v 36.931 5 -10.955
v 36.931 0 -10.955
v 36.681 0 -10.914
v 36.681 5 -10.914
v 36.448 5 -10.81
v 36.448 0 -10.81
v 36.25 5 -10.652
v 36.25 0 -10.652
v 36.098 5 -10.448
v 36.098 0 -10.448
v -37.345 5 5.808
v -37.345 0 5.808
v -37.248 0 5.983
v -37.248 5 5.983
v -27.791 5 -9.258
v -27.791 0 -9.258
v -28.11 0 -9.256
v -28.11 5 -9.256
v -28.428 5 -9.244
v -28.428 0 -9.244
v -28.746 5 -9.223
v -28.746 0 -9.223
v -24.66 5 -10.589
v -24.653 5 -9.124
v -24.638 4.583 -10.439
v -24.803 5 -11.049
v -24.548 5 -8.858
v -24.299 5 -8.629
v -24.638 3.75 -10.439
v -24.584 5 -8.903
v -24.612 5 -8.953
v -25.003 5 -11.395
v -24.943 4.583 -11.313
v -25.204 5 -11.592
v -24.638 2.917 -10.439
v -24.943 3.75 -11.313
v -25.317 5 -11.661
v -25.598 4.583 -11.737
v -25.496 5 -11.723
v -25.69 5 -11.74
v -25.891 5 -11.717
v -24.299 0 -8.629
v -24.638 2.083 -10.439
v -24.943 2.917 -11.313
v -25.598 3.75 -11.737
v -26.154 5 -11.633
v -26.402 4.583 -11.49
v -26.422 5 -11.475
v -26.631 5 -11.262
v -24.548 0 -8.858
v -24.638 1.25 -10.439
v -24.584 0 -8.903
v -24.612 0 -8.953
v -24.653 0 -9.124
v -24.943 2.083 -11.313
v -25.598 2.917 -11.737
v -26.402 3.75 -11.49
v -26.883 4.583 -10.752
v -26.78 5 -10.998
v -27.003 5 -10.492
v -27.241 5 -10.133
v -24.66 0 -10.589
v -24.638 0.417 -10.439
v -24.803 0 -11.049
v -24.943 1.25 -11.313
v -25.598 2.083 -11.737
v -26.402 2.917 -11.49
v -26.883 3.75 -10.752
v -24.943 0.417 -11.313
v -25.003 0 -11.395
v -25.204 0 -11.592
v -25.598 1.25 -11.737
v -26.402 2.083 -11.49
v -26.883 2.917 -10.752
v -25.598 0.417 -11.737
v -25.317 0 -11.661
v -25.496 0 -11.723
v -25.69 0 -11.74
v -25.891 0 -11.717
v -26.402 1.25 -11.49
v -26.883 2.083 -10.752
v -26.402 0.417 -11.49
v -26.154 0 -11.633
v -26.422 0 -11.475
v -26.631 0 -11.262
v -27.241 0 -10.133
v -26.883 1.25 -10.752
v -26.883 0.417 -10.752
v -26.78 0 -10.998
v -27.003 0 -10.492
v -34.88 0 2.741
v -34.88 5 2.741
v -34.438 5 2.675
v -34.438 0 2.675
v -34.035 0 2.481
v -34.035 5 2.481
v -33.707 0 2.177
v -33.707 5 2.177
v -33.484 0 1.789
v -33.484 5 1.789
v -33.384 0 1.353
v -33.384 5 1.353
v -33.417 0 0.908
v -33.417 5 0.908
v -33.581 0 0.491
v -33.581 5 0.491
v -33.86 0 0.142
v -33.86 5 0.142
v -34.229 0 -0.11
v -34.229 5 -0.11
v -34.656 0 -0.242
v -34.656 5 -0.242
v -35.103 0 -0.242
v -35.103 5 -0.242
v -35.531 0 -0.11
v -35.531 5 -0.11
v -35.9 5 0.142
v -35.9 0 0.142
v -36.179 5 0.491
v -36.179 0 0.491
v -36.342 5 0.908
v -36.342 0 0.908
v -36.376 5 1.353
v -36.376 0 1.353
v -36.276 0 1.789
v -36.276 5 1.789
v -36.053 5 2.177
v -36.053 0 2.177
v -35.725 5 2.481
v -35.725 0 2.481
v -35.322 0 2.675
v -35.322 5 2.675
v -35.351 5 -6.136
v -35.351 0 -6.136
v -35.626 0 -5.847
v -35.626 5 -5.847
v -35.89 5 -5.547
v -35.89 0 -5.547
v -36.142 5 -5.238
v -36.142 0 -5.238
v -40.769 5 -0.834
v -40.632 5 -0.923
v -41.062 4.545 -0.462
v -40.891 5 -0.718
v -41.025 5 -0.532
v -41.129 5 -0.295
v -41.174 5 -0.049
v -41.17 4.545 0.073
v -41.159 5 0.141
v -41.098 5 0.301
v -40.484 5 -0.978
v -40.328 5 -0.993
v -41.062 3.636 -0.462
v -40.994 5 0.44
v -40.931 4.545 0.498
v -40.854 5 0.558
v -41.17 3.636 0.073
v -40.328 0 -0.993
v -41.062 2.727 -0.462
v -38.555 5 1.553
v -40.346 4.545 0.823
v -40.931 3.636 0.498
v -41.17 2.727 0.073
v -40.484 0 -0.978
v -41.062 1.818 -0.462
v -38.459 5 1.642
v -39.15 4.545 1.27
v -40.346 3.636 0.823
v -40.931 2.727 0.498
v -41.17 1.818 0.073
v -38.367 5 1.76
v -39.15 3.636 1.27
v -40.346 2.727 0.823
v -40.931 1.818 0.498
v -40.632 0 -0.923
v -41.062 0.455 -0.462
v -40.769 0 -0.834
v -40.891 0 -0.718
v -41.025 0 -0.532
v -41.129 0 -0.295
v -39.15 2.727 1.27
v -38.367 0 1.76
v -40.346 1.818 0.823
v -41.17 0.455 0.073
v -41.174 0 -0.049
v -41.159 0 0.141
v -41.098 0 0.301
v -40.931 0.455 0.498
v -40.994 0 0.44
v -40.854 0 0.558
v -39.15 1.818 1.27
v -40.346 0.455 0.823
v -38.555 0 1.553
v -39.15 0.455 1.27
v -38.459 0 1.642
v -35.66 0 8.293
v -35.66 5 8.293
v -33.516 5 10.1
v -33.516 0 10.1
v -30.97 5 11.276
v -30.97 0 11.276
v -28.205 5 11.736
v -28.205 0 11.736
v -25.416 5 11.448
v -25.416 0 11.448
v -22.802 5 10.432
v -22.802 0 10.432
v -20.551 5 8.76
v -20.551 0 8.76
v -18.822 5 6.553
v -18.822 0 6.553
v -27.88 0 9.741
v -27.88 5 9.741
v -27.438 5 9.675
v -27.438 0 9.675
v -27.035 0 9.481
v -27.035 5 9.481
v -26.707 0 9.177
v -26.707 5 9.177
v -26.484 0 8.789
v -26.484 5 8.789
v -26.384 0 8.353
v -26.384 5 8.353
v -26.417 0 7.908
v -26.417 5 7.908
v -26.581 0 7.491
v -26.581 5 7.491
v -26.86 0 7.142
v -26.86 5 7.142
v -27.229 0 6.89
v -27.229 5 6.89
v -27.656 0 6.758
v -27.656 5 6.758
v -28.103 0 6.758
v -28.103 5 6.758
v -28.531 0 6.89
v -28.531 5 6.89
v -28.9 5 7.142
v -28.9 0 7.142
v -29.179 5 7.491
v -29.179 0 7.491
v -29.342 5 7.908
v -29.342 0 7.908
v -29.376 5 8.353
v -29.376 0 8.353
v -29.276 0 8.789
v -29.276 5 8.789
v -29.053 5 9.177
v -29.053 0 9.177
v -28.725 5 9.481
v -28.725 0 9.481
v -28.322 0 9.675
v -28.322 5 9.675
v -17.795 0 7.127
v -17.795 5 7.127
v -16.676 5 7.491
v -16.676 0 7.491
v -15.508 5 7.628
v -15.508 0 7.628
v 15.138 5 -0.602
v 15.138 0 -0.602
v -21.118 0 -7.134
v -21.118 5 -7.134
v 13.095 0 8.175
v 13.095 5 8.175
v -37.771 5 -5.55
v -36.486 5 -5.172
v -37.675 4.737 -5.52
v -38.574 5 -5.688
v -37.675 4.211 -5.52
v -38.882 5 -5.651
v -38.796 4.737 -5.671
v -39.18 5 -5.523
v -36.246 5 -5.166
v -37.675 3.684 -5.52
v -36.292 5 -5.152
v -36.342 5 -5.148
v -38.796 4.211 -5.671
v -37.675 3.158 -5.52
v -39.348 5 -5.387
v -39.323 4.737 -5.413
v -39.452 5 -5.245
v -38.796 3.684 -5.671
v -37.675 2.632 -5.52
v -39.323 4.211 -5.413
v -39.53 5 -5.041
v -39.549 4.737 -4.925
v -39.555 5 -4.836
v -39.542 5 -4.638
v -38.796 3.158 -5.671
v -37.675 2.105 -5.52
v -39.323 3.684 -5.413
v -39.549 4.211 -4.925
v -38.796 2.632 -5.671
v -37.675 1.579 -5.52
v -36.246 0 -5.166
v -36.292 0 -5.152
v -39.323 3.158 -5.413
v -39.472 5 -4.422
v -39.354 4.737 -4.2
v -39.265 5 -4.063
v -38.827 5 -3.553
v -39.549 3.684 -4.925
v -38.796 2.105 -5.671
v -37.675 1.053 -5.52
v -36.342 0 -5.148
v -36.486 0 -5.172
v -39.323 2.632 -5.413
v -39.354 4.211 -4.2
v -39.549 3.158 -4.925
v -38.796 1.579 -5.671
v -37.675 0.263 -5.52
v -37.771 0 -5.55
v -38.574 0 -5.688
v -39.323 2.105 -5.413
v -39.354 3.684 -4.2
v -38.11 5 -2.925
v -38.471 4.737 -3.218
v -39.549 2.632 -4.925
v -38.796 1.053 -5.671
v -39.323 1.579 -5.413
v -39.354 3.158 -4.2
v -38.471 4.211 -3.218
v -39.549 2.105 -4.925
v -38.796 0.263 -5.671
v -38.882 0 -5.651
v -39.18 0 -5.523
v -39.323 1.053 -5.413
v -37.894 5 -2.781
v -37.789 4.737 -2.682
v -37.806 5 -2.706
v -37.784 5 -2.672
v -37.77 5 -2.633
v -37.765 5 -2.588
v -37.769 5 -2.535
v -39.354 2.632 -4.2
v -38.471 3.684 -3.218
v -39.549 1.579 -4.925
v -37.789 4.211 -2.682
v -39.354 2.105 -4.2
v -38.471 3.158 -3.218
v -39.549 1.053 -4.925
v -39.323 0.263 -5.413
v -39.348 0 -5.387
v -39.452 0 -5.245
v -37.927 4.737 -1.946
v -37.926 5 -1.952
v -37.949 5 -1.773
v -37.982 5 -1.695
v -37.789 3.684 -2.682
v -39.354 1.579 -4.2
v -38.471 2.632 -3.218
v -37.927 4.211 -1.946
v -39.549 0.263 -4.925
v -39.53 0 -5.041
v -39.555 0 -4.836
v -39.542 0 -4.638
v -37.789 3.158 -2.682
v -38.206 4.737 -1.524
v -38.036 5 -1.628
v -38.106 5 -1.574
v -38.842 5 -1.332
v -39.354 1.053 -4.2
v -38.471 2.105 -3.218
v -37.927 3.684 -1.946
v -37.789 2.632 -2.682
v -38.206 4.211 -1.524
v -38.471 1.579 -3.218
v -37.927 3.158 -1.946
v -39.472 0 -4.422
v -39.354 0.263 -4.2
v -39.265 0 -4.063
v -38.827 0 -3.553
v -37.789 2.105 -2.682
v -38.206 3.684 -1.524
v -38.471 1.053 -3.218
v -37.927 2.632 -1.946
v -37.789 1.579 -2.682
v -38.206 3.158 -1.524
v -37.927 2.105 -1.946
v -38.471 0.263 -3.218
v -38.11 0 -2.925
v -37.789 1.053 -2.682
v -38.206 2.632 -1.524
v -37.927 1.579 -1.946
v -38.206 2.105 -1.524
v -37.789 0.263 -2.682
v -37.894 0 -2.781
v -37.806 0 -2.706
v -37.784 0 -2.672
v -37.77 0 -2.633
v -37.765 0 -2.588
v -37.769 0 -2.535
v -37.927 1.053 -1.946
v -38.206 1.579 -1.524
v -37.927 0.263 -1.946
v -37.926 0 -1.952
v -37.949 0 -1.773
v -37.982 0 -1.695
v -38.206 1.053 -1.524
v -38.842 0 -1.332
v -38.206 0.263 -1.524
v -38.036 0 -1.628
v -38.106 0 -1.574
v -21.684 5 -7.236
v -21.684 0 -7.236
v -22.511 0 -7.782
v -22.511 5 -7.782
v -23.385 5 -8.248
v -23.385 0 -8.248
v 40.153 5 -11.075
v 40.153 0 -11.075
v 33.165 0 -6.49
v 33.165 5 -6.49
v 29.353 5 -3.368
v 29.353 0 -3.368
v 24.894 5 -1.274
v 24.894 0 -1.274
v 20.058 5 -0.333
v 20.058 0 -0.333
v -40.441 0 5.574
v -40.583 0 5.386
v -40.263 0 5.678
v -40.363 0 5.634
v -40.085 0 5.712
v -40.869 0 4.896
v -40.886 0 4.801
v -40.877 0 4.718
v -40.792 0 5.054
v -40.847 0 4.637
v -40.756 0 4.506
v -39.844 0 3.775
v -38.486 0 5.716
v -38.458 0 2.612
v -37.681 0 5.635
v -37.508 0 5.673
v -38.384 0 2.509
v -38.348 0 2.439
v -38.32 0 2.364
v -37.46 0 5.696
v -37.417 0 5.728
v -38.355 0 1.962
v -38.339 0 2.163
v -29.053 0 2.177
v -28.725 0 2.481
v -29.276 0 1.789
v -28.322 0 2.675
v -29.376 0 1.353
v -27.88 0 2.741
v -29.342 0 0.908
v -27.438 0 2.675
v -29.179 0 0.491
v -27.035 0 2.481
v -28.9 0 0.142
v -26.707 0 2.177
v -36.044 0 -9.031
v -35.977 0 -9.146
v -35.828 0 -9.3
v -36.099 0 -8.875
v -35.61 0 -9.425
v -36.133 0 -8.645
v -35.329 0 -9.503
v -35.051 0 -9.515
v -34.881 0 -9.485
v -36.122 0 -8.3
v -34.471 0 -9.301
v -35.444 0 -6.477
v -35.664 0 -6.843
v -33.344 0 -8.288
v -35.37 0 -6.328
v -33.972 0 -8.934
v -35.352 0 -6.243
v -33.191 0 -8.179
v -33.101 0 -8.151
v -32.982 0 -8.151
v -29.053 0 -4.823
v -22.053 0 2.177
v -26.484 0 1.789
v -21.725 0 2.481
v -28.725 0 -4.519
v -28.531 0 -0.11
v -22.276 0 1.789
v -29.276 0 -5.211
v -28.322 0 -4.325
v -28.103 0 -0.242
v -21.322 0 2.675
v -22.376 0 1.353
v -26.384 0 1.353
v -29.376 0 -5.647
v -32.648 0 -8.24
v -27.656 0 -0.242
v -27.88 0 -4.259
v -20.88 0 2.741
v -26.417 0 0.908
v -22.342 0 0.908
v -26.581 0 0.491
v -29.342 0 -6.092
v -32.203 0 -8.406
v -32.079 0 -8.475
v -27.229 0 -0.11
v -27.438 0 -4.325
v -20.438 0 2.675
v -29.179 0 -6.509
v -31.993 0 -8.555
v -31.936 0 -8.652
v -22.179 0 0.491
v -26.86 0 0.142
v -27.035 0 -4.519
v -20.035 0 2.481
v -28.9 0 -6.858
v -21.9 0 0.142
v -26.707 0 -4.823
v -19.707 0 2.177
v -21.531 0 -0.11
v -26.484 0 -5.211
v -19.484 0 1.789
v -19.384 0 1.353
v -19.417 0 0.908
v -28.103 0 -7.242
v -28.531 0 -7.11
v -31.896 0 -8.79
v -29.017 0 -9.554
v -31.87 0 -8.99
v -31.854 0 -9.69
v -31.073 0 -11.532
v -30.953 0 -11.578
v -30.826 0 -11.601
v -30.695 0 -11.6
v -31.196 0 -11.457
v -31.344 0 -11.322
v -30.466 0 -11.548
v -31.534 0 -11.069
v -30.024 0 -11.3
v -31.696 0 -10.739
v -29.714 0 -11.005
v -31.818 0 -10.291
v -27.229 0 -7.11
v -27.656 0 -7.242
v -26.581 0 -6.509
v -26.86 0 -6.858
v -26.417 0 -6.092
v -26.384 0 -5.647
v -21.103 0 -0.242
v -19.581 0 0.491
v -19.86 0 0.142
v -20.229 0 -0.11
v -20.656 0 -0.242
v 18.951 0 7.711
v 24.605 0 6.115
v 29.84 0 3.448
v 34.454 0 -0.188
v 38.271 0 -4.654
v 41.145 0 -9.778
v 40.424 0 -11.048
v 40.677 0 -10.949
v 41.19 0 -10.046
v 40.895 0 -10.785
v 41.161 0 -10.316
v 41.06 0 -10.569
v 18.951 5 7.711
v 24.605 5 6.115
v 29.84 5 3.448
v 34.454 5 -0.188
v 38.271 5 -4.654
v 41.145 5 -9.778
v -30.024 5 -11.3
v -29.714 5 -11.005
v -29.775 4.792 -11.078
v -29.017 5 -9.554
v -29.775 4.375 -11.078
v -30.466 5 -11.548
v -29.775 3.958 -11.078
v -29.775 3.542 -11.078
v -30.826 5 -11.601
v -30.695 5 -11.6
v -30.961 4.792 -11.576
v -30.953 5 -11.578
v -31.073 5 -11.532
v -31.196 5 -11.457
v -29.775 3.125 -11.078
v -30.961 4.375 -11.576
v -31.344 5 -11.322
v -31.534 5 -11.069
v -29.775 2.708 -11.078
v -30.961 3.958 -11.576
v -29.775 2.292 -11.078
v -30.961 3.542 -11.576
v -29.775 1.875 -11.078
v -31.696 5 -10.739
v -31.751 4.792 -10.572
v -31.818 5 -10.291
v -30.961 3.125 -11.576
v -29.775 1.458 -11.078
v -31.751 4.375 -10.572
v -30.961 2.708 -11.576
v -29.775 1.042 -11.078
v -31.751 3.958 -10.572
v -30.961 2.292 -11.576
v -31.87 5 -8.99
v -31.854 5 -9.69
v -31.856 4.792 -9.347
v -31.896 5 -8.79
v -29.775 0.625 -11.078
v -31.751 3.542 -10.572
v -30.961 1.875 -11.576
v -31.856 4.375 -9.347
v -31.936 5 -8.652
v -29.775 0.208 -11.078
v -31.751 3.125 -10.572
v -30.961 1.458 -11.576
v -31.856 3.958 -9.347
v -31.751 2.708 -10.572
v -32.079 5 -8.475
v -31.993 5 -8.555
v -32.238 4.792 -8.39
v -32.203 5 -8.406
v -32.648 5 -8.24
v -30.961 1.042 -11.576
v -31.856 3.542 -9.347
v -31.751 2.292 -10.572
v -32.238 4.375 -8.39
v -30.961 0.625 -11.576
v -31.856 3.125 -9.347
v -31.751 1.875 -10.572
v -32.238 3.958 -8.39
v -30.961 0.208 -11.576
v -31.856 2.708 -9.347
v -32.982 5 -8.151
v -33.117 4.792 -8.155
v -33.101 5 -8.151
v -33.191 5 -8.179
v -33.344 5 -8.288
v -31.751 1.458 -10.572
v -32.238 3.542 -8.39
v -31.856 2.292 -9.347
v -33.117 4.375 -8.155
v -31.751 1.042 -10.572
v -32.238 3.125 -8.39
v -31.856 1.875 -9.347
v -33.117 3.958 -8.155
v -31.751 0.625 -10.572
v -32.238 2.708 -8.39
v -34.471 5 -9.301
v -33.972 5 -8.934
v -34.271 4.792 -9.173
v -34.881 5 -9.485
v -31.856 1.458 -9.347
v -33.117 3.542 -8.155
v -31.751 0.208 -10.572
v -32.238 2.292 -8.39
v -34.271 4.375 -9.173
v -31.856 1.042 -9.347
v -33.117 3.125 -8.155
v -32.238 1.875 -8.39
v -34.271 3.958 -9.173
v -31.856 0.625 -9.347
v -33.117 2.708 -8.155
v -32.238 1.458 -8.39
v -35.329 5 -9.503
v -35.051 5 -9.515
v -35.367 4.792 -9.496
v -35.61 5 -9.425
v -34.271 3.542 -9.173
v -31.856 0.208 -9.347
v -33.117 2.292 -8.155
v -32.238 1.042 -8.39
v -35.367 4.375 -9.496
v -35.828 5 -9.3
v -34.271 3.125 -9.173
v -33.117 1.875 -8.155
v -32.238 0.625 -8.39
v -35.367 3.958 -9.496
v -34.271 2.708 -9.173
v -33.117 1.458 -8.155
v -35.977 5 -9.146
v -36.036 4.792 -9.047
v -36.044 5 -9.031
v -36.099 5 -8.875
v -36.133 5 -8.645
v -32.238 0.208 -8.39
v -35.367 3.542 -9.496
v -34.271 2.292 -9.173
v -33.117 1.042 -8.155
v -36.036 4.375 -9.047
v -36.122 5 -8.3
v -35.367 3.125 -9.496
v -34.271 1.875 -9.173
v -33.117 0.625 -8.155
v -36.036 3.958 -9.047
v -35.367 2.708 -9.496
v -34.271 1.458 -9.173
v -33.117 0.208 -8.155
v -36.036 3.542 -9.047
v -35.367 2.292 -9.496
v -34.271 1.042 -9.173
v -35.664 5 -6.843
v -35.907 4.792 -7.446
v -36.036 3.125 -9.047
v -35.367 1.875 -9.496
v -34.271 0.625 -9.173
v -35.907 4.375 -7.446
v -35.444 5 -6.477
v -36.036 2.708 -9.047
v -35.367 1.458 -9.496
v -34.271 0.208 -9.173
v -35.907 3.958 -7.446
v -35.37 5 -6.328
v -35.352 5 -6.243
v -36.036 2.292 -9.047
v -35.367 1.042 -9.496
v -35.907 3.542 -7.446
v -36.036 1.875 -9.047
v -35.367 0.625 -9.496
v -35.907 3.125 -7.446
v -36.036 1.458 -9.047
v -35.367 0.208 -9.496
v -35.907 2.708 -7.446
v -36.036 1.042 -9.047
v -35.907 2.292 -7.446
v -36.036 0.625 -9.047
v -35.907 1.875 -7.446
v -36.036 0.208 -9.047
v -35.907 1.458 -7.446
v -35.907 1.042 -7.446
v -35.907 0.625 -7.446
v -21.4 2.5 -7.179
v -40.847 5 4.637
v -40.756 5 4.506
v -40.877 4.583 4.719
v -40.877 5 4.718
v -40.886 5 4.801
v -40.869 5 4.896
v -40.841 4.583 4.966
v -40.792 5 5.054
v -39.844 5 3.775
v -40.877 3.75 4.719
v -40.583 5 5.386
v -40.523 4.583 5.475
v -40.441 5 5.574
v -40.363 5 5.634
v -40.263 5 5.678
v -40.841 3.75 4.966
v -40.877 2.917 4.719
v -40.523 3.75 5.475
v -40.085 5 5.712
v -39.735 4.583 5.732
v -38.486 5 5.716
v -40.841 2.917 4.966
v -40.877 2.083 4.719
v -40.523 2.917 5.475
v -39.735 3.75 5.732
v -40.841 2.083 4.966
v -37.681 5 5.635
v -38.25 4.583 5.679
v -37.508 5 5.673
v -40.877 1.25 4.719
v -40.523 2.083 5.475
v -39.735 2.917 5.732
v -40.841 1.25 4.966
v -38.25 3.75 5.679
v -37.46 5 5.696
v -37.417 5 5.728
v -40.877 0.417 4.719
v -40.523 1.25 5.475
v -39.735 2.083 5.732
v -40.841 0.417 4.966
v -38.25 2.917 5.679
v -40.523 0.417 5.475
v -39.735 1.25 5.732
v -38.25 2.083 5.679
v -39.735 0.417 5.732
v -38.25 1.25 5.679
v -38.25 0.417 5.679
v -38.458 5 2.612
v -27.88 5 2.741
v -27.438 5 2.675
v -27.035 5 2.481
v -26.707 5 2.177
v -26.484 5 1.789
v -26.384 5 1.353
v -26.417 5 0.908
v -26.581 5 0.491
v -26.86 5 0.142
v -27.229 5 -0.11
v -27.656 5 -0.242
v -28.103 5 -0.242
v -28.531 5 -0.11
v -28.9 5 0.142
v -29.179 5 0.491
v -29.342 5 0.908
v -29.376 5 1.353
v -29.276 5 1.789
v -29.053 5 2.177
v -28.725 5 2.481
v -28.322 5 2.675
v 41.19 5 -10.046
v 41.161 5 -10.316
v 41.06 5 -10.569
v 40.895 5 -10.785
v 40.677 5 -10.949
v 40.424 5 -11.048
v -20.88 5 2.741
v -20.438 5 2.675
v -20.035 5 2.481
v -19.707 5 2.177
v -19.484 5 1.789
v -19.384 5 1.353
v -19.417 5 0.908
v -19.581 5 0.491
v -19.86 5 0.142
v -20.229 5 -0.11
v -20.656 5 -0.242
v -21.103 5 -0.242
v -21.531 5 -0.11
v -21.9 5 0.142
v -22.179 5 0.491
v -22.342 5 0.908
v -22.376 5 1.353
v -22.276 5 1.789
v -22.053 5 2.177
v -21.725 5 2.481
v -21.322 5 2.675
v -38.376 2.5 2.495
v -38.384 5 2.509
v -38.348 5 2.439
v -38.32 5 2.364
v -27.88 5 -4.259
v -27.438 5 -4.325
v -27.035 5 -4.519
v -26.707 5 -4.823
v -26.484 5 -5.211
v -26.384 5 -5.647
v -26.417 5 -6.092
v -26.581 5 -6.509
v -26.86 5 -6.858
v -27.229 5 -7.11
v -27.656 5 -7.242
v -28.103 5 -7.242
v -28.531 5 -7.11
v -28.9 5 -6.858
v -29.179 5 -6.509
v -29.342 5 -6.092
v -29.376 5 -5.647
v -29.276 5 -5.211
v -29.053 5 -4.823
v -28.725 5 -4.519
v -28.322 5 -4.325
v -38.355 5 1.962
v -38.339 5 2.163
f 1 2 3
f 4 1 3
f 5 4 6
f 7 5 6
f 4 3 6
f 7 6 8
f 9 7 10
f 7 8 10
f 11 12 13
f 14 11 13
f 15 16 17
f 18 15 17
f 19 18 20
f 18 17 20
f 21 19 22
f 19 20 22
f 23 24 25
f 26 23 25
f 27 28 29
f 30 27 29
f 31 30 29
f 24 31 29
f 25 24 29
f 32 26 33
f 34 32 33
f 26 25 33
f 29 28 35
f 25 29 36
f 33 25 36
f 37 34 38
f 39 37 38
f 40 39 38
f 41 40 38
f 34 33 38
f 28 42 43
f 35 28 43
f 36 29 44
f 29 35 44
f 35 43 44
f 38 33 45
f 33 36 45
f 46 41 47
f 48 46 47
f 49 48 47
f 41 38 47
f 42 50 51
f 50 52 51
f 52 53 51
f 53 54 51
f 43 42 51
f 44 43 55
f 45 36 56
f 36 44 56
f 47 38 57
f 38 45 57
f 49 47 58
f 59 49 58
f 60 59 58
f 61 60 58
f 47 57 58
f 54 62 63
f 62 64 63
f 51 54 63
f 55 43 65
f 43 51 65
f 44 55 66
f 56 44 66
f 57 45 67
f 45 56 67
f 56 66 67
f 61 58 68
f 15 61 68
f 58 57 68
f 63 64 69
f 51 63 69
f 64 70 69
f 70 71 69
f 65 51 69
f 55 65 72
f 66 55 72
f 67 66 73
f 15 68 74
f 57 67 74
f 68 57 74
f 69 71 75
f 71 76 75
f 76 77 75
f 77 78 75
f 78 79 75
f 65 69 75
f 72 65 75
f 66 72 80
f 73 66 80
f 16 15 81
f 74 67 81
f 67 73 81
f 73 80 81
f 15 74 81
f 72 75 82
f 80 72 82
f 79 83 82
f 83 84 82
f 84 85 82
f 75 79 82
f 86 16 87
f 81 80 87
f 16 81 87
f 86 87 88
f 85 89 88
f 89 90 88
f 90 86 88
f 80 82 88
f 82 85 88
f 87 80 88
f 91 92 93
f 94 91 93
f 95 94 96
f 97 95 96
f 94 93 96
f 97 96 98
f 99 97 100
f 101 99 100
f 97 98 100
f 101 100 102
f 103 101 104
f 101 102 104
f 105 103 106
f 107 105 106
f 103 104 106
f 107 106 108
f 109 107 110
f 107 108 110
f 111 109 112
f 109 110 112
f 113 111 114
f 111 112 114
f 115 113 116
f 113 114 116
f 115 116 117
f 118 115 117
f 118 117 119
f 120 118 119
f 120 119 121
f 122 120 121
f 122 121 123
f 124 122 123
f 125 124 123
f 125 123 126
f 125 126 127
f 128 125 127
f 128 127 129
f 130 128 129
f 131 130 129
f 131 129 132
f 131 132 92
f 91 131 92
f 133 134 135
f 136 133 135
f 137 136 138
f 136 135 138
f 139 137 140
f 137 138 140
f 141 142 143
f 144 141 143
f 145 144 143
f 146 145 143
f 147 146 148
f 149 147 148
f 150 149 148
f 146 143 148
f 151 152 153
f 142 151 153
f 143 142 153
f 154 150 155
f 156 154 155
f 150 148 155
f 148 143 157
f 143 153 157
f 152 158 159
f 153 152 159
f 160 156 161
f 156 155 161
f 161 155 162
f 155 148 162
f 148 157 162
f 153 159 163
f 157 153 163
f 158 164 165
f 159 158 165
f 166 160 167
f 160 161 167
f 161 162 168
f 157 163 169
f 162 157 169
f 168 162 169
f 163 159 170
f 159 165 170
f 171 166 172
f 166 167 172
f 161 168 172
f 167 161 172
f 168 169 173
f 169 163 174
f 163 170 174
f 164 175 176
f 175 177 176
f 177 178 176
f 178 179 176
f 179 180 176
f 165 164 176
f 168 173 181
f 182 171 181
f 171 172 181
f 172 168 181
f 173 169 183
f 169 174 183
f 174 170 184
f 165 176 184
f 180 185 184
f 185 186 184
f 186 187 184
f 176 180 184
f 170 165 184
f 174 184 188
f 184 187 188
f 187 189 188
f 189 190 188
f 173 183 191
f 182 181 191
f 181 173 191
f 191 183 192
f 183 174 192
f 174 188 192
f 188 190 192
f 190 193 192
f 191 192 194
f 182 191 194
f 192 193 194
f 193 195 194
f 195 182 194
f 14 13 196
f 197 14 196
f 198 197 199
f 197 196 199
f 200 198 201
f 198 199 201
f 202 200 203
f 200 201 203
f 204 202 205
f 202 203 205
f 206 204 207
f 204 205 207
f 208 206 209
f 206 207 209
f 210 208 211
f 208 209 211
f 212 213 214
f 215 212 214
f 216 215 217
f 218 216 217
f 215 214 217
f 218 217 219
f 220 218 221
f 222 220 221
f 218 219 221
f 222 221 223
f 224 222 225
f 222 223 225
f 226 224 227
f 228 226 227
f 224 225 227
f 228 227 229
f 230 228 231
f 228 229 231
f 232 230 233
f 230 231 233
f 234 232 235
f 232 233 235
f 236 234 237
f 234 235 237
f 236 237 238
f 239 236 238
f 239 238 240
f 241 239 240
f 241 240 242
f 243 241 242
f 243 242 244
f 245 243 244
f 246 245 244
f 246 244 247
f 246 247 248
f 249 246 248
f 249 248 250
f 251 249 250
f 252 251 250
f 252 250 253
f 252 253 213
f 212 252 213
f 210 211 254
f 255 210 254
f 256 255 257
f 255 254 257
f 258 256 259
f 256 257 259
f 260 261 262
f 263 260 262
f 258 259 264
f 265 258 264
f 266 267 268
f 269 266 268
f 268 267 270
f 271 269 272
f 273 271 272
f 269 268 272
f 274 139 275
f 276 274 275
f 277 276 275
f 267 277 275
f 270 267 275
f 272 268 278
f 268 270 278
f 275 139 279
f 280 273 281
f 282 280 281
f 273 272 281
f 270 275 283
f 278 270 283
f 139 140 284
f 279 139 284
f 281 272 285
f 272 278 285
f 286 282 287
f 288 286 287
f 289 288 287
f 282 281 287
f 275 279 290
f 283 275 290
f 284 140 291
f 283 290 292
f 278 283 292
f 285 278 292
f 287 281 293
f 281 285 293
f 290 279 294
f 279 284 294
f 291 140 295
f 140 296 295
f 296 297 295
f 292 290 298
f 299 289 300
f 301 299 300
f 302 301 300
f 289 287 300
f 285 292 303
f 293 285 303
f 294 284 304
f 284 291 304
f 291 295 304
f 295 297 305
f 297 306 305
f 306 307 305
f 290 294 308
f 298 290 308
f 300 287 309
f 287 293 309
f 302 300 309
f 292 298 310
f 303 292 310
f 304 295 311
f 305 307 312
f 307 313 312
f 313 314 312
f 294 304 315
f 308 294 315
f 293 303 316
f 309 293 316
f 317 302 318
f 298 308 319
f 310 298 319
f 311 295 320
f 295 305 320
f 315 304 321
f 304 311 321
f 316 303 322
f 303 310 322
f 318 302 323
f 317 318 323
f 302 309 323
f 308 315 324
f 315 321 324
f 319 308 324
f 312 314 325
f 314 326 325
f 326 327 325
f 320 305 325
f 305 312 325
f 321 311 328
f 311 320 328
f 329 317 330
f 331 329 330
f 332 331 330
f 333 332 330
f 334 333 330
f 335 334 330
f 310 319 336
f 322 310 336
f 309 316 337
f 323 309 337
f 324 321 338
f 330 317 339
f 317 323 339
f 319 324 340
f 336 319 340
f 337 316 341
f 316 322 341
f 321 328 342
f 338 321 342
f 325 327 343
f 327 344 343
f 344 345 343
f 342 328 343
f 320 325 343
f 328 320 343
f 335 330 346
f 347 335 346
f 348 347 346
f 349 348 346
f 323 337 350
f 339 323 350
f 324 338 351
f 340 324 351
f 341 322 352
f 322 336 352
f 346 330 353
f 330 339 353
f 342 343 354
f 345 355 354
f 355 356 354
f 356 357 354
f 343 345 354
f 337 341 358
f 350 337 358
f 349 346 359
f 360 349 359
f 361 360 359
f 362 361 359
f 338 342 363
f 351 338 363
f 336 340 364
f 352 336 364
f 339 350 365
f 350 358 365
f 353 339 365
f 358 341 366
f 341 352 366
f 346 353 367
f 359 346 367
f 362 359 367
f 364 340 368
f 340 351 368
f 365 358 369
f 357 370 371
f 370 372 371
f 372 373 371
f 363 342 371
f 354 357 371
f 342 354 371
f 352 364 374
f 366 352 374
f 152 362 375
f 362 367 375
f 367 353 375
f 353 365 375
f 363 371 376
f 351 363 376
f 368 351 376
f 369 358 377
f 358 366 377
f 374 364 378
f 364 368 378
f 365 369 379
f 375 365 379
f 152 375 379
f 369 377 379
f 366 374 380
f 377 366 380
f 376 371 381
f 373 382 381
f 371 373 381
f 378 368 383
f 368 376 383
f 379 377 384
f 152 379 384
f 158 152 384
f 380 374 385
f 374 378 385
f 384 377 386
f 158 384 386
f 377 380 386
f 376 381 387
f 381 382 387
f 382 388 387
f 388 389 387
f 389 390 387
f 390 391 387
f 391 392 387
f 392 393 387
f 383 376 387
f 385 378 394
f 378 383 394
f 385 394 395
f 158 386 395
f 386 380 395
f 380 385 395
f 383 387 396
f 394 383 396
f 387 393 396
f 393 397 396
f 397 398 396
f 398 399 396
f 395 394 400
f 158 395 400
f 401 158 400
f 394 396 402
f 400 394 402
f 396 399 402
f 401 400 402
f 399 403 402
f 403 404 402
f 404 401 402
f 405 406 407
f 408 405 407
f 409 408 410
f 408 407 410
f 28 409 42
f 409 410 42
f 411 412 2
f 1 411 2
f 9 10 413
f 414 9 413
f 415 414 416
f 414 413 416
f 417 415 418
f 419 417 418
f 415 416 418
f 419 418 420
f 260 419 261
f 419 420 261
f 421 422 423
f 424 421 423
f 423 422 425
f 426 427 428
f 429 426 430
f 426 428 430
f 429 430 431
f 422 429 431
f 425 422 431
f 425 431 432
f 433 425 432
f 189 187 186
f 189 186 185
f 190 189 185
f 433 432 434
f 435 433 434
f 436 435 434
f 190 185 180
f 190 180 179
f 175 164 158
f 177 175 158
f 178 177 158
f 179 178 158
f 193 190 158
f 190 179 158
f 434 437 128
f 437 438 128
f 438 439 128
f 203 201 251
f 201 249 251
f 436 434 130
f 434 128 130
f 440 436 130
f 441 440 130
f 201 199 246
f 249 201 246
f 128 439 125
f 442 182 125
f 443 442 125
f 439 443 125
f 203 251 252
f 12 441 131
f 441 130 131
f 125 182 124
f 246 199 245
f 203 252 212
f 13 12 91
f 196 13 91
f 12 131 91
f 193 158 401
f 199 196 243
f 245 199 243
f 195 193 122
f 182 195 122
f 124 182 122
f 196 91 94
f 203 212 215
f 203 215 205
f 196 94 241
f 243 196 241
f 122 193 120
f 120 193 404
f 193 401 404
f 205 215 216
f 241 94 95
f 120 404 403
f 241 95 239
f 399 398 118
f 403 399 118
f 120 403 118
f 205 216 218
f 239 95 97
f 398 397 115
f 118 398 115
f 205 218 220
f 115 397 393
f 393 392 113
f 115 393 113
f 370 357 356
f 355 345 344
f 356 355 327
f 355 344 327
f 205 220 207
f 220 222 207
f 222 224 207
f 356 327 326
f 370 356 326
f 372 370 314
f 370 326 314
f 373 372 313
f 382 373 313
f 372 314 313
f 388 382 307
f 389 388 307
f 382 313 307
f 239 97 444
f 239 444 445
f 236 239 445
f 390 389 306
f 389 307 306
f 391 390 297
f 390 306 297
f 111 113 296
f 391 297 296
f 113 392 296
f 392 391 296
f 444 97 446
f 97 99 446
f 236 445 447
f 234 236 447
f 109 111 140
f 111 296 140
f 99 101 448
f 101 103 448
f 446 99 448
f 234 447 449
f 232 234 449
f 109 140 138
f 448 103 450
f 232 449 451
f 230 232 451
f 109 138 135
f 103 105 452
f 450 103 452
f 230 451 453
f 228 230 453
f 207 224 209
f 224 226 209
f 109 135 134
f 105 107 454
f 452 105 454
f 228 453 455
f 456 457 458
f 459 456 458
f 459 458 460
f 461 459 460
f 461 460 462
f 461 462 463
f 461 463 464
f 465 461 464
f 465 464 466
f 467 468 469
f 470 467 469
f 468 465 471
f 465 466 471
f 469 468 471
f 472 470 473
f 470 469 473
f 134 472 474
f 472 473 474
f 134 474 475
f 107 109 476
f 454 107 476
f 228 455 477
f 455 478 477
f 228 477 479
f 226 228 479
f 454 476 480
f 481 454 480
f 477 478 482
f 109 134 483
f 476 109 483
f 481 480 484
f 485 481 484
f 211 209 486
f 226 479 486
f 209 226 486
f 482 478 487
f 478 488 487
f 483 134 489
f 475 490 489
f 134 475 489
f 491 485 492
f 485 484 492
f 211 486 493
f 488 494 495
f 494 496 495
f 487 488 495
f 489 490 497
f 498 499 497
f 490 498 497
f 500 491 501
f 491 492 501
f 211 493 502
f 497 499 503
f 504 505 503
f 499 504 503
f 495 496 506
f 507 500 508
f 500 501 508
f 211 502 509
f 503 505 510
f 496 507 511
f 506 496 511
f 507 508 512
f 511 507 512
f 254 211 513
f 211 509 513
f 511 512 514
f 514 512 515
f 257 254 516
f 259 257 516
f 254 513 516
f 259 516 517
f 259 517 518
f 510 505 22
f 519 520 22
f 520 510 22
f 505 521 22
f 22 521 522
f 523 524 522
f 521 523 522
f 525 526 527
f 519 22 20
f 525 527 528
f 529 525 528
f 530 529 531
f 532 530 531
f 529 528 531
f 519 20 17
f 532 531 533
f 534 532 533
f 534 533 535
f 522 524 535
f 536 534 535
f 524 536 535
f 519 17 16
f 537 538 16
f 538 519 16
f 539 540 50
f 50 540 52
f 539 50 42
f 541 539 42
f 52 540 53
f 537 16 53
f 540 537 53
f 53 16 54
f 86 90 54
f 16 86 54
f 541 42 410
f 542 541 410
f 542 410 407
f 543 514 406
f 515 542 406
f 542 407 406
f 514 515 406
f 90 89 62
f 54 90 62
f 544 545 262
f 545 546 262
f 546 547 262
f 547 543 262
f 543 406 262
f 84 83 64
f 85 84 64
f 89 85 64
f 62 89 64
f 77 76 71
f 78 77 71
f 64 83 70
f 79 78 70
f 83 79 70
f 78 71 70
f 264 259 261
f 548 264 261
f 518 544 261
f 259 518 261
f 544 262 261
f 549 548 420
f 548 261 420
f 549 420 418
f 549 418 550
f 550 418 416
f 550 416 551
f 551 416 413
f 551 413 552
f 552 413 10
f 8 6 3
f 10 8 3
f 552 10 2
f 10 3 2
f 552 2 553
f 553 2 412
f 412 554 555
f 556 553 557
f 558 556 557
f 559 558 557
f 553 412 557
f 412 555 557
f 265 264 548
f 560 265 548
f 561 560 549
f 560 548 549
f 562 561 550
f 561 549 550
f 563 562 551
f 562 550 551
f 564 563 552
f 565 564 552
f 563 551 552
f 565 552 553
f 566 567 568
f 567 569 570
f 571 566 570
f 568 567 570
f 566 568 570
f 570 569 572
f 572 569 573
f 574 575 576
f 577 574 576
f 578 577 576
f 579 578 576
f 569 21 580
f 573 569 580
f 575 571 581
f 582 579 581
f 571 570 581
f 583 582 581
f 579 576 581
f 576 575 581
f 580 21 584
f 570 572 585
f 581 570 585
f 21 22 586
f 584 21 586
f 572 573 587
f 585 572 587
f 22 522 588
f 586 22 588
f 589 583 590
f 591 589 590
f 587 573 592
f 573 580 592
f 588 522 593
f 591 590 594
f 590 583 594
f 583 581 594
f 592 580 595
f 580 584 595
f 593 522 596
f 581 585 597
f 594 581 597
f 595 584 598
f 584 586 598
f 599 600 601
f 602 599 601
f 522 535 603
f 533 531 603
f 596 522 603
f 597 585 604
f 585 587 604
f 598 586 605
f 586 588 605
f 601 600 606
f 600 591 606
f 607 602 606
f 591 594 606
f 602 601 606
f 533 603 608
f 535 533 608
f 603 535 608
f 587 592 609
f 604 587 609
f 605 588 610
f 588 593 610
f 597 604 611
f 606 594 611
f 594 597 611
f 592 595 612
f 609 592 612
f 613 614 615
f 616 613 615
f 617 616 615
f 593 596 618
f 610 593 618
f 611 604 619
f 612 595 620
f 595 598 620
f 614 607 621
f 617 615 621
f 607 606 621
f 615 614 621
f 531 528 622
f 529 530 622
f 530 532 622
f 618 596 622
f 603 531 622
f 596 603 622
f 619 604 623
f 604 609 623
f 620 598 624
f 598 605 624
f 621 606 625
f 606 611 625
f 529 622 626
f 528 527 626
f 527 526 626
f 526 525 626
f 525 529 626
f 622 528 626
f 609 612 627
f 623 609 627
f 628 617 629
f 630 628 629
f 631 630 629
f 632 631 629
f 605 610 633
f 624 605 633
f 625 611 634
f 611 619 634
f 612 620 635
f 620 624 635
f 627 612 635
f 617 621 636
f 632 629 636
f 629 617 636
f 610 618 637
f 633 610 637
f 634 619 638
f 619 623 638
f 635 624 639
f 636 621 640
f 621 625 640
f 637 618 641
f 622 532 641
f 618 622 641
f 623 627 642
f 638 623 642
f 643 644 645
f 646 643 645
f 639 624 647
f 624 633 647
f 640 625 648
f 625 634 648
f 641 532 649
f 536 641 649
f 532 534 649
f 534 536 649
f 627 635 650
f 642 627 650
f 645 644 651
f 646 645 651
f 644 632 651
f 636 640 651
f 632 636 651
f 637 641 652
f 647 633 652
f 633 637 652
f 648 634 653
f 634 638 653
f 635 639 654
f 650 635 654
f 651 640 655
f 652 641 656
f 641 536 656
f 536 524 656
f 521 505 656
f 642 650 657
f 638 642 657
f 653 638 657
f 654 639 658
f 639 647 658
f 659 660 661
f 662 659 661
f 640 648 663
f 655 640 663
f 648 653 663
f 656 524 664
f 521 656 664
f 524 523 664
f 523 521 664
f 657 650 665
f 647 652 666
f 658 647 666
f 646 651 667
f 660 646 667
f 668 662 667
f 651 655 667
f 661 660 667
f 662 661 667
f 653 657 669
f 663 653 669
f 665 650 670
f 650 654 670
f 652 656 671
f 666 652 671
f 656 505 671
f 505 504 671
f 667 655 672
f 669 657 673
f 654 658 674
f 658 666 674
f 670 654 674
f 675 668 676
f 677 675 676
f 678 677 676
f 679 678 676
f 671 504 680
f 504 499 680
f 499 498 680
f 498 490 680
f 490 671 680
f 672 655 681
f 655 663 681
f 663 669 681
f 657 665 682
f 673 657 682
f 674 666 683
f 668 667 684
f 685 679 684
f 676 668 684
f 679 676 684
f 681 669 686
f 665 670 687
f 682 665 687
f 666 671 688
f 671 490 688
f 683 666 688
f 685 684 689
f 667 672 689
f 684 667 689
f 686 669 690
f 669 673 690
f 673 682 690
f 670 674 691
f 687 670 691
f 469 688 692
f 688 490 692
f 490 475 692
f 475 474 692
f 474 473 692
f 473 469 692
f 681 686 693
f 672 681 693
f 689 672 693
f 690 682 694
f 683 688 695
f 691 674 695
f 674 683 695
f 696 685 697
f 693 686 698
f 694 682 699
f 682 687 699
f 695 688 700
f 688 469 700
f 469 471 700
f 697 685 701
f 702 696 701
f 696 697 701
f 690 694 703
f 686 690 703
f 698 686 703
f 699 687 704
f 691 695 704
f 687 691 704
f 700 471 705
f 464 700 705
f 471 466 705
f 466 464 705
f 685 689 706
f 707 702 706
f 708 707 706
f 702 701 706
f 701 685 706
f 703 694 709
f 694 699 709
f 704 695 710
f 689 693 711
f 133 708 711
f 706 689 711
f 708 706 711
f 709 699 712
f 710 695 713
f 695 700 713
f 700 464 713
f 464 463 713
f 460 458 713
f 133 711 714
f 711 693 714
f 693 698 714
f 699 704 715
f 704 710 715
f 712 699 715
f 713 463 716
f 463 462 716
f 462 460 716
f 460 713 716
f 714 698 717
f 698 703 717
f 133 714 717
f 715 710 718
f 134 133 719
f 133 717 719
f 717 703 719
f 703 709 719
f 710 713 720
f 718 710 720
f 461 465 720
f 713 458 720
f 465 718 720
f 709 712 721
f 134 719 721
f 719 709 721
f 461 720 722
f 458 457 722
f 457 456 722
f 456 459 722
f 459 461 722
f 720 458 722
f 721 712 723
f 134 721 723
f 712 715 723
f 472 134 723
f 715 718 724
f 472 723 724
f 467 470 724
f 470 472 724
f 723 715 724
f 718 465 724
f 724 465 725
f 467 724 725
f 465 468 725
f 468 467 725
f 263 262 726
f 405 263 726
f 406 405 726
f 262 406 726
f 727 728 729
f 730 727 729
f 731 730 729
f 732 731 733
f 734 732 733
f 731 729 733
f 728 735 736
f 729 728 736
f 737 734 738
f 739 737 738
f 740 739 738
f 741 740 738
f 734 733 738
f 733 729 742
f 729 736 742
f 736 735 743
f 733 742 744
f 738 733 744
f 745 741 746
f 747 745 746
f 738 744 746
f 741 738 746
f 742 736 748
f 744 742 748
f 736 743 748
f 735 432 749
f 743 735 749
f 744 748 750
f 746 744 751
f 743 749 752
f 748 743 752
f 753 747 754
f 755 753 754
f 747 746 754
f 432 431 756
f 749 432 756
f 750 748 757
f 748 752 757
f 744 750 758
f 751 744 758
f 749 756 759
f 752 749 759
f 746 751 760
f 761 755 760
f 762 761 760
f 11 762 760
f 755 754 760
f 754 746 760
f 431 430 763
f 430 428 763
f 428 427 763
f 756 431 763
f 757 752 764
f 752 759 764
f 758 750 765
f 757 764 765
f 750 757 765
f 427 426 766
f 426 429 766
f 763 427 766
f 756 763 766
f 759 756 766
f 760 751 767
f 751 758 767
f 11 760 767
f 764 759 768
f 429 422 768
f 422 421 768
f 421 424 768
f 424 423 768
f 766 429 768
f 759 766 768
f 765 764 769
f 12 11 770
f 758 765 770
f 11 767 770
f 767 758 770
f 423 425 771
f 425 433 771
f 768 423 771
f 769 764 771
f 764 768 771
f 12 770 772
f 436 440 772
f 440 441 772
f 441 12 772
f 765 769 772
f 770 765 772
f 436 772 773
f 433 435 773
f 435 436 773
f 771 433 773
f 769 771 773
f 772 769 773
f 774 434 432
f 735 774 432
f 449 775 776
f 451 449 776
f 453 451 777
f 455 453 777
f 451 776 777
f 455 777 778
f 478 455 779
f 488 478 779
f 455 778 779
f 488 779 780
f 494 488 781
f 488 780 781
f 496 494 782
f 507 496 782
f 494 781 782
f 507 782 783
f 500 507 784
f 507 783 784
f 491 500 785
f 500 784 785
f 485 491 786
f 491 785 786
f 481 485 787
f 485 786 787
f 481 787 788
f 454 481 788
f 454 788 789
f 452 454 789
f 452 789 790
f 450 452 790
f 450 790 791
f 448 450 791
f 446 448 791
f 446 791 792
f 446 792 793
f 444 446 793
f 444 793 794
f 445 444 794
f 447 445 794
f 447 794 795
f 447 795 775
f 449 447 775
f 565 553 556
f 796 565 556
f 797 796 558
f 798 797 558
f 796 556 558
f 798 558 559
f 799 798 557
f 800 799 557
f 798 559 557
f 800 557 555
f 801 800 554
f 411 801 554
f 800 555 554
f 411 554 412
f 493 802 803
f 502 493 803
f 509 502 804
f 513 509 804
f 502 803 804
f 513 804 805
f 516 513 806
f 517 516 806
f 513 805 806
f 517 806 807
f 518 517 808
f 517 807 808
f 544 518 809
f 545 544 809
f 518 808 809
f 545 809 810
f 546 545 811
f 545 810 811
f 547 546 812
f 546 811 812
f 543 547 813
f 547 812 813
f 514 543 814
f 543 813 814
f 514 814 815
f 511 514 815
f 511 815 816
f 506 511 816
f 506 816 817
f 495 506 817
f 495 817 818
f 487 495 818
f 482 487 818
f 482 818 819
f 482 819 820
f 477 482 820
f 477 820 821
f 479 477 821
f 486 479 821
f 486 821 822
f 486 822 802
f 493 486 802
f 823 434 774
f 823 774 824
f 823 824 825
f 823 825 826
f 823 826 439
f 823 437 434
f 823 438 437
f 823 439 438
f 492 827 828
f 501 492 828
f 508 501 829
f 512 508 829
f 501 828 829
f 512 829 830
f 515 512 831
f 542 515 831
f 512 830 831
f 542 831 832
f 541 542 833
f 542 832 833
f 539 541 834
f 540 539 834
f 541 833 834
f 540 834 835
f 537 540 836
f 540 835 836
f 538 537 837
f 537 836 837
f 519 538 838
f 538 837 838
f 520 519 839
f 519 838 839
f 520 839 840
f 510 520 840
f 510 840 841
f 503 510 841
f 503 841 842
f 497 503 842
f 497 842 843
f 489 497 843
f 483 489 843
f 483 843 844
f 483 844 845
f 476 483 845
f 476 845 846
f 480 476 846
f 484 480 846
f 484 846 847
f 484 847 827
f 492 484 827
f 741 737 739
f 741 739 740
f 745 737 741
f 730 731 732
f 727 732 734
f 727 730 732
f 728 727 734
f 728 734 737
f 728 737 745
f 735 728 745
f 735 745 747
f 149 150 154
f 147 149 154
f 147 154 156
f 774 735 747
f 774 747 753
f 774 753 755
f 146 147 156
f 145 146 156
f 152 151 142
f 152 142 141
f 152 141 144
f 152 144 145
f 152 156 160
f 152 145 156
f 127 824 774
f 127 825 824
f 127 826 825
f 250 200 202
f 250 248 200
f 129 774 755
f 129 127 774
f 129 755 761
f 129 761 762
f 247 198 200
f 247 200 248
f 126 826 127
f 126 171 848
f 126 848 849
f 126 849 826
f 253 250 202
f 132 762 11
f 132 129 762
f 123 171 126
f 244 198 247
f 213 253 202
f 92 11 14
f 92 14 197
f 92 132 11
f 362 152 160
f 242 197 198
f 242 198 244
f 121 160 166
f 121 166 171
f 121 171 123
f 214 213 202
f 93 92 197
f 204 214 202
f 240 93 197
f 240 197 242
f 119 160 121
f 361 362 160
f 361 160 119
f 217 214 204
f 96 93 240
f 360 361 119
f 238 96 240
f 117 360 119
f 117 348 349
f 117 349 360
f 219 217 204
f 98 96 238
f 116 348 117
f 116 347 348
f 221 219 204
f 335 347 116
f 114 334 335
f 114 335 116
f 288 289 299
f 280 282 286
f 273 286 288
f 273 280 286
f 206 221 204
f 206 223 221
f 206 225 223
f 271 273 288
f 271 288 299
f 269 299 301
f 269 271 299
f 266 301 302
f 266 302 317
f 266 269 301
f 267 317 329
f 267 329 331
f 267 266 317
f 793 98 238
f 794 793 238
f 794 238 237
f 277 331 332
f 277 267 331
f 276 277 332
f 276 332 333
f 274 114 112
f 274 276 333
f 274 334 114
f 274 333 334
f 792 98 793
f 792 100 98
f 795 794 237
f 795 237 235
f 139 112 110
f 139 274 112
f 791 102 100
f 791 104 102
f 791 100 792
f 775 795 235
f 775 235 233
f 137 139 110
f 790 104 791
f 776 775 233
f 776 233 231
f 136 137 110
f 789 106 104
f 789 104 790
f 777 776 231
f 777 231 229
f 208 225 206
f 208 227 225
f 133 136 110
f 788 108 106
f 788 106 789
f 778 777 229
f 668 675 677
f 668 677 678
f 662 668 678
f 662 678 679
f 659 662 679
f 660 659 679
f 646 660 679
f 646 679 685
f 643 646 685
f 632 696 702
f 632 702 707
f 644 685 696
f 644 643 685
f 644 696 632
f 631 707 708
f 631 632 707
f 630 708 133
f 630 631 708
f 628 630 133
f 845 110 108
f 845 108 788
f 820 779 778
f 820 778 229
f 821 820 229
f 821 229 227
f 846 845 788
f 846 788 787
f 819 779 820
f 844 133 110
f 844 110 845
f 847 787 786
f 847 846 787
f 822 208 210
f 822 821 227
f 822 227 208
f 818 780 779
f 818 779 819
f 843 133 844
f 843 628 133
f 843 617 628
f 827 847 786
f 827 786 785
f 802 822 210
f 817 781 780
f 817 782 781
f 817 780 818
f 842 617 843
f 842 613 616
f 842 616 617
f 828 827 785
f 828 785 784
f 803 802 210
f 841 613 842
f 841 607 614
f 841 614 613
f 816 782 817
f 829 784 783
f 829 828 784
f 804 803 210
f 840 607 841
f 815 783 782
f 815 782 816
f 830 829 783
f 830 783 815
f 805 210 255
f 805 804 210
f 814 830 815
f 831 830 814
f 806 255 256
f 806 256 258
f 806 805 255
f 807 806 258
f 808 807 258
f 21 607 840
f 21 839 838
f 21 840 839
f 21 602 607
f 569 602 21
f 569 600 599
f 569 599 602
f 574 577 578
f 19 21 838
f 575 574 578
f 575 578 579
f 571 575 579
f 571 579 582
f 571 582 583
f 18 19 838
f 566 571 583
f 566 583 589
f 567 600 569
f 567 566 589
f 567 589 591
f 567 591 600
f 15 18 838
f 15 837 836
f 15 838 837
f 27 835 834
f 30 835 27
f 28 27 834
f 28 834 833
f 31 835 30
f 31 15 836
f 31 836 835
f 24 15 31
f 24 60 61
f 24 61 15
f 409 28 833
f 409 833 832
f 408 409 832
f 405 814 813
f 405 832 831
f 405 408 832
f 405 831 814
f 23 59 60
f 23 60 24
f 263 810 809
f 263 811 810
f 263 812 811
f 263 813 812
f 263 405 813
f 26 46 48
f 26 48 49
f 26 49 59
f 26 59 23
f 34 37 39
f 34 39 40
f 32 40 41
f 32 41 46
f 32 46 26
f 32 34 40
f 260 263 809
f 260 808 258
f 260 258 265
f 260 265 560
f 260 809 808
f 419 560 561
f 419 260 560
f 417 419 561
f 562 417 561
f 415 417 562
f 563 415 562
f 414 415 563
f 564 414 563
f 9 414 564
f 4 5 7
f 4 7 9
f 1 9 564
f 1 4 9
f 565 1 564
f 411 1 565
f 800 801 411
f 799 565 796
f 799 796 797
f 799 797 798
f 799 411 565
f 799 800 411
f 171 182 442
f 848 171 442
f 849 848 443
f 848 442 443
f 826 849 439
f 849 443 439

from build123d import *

# Parameters (mm, degrees)
EXTRUDE_1_DEPTH     = 5
SKETCH_2_R          = 1.5
CUT_EXTRUDE_1_DEPTH = 10


with BuildPart() as part:
    # 草图1 → 凸台-拉伸1 (new body)
    with BuildSketch(Plane(origin=(0, 0, 0), x_dir=(1, 0, 0), z_dir=(0, 1, 0))):
        with BuildLine():
            Line((-37.344631386, -5.807950968), (-37.248411234, -5.982727122))
            ThreePointArc((-37.248411234, -5.982727122), (-28.204573284, -11.73633278), (-18.822361929, -6.552792192))
            ThreePointArc((-18.822361929, -6.552792192), (-17.244766286, -7.336536325), (-15.507553828, -7.628350916))
            Line((-15.507553828, -7.628350916), (13.095059506, -8.174629585))
            ThreePointArc((13.095059506, -8.174629585), (29.839725685, -3.448118413), (41.144848497, 9.777536636))
            ThreePointArc((41.144848497, 9.777536636), (40.984858326, 10.682910927), (40.153252945, 11.07499759))
            Line((40.153252945, 11.07499759), (36.931315171, 10.955458653))
            ThreePointArc((36.931315171, 10.955458653), (36.448414047, 10.810326358), (36.097720698, 10.448012884))
            ThreePointArc((36.097720698, 10.448012884), (27.187916573, 2.183173181), (15.138321905, 0.602207281))
            Line((15.138321905, 0.602207281), (-21.117956687, 7.13390607))
            add(Edge.make_bspline(
                [(-21.117956687, 7.13390607), (-21.212438708, 7.147145532), (-21.306506603, 7.162309908), (-21.49538337, 7.196421735), (-21.589951037, 7.215369103), (-21.684261093, 7.235927839)],
                knots=[0, 0, 0, 0, 0.49706449, 0.49706449, 1, 1, 1, 1], degree=3, weights=[1, 1, 1, 1, 1, 1]))
            ThreePointArc((-21.684261093, 7.235927839), (-22.942337934, 8.025289306), (-24.299203626, 8.629246555))
            add(Edge.make_bspline(
                [(-24.299203626, 8.629246555), (-24.532798722, 8.924723672), (-24.768102501, 8.685486998), (-24.578542349, 10.190095573), (-24.654571202, 10.621705824), (-24.803745168, 11.123175885), (-25.053216231, 11.500198593), (-25.382740348, 11.741312615), (-25.805116059, 11.763790533), (-26.234027965, 11.628949186), (-26.602472691, 11.360783902), (-26.800767539, 10.992466414), (-27.032088728, 10.297448588), (-27.38256735, 9.995847546), (-27.702570577, 9.507372882), (-27.790875823, 9.258268525)],
                knots=[0, 0, 0, 0, 0, 0.167449509, 0.23958565, 0.313308301, 0.377037583, 0.439843636, 0.502444094, 0.564991993, 0.628373038, 0.693637199, 0.75910753, 0.826531761, 1, 1, 1, 1, 1], degree=4, weights=[1, 1, 1, 1, 1, 1, 1, 1, 1, 1, 1, 1, 1, 1, 1, 1]))
            ThreePointArc((-27.790875823, 9.258268525), (-28.268832567, 9.251439266), (-28.745983221, 9.222864058))
            add(Edge.make_bspline(
                [(-28.745983221, 9.222864058), (-29.066902207, 9.563243986), (-29.003830101, 9.495579417), (-29.514766582, 10.868497408), (-29.905161613, 11.223837825), (-30.346177399, 11.538345016), (-30.775308403, 11.647798666), (-31.15694413, 11.538709287), (-31.463842893, 11.213375665), (-31.705842412, 10.790755006), (-31.834670629, 10.277302759), (-31.866419694, 9.944996347), (-31.83604185, 8.770191318), (-31.986261554, 8.468967586), (-32.398385173, 8.329764062), (-33.012499398, 8.104959766), (-33.283321133, 8.126370455), (-33.879895168, 8.955709674), (-34.680669704, 9.454345775), (-35.06284292, 9.55525948), (-35.587974873, 9.478312866), (-35.964127285, 9.236934851), (-36.147105333, 8.859096563), (-36.146073043, 8.329493687), (-36.031334854, 7.805540112), (-35.622327566, 6.448258774), (-35.326900327, 6.495329828), (-35.351333042, 6.136137531)],
                knots=[0, 0, 0, 0, 0, 0.095392435, 0.134991598, 0.173690734, 0.207189476, 0.240204146, 0.273289811, 0.306894938, 0.34165608, 0.381579194, 0.419993738, 0.457685482, 0.49601353, 0.527899598, 0.564801156, 0.606644671, 0.647351641, 0.689606269, 0.727605881, 0.760625769, 0.793889264, 0.82747582, 0.866012031, 0.906297584, 1, 1, 1, 1, 1], degree=4, weights=[1, 1, 1, 1, 1, 1, 1, 1, 1, 1, 1, 1, 1, 1, 1, 1, 1, 1, 1, 1, 1, 1, 1, 1, 1, 1, 1, 1]))
            ThreePointArc((-35.351333042, 6.136137531), (-35.759710345, 5.698261663), (-36.142464276, 5.237819781))
            add(Edge.make_bspline(
                [(-36.142464276, 5.237819781), (-36.316981842, 5.08700098), (-36.364843159, 5.164195713), (-37.277553315, 5.361322432), (-37.942352515, 5.632502616), (-38.633084665, 5.719911328), (-38.916484297, 5.653640329), (-39.225256107, 5.520939787), (-39.426320972, 5.322329921), (-39.547878388, 5.065868766), (-39.568398866, 4.735036382), (-39.524871996, 4.458902174), (-39.16786209, 3.873039426), (-38.740480537, 3.466567721), (-38.254674568, 3.007325653), (-37.89044397, 2.777372811), (-37.656773339, 2.648376094), (-37.969468798, 2.074801064), (-37.897206508, 1.785036627), (-38.16497334, 1.405765757), (-38.769354556, 1.455206174), (-39.306904188, 1.096918841), (-40.327751852, 0.992639828)],
                knots=[0, 0, 0, 0, 0, 0.102550458, 0.155534355, 0.209164784, 0.256715345, 0.297927651, 0.334519967, 0.370936874, 0.407252906, 0.448167315, 0.495157377, 0.547294774, 0.600812707, 0.64848443, 0.693866455, 0.734504866, 0.772381689, 0.811633204, 0.850281548, 1, 1, 1, 1, 1], degree=4, weights=[1, 1, 1, 1, 1, 1, 1, 1, 1, 1, 1, 1, 1, 1, 1, 1, 1, 1, 1, 1, 1, 1, 1]))
            add(Edge.make_bspline(
                [(-40.327751852, 0.992639828), (-40.49027737, 0.999571003), (-40.713154313, 0.91888235), (-40.954457401, 0.693661162), (-41.131350194, 0.334630013), (-41.190329001, 0.056784013), (-41.165475288, -0.202186055), (-41.036582783, -0.421471855), (-40.816165219, -0.600297662), (-40.485452339, -0.766914084), (-40.174203742, -0.898416494), (-39.25769897, -1.22048507), (-38.599409521, -1.479244035), (-38.503826201, -1.571250392), (-38.367074379, -1.759763033)],
                knots=[0, 0, 0, 0, 0, 0.159645777, 0.225638641, 0.291020065, 0.354611709, 0.417161288, 0.480844731, 0.547969405, 0.628060899, 0.718716062, 0.808353036, 1, 1, 1, 1, 1], degree=4, weights=[1, 1, 1, 1, 1, 1, 1, 1, 1, 1, 1, 1, 1, 1, 1]))
            ThreePointArc((-38.367074379, -1.759763033), (-38.347731001, -2.0623835), (-38.319656978, -2.364319193))
            add(Edge.make_bspline(
                [(-38.458232897, -2.611814716), (-38.363269625, -2.502883946), (-38.319656978, -2.364319193)],
                knots=[6.268589243, 6.268589243, 6.268589243, 6.667480636, 6.667480636, 6.667480636], degree=2, weights=[1, 0.98017655, 1]))
            Line((-38.458232897, -2.611814716), (-39.843574761, -3.775330159))
            add(Edge.make_bspline(
                [(-39.843574761, -3.775330159), (-40.139361501, -3.958461335), (-40.682847629, -4.400349644), (-40.828769837, -4.549848056), (-40.898925147, -4.775101532), (-40.871489252, -4.91522108), (-40.811114459, -5.028783036), (-40.571272458, -5.405781269), (-40.423210722, -5.641288577), (-40.145787809, -5.743817026), (-39.223236405, -5.725906874), (-38.753478222, -5.796957019), (-37.770070415, -5.55854552), (-37.471743463, -5.662437325), (-37.408096689, -5.726699879), (-37.344631386, -5.807950968)],
                knots=[0, 0, 0, 0, 0, 0.194272729, 0.24161924, 0.28232288, 0.331387847, 0.386783464, 0.447394339, 0.523862686, 0.607321354, 0.701771427, 0.796543812, 0.874384733, 1, 1, 1, 1, 1], degree=4, weights=[1, 1, 1, 1, 1, 1, 1, 1, 1, 1, 1, 1, 1, 1, 1, 1]))
        make_face()
    extrude(amount=EXTRUDE_1_DEPTH)

    # 草图2 → 切除-拉伸1 (cut)
    with BuildSketch(Plane(origin=(0, 5, 0), x_dir=(1, 0, 0), z_dir=(0, 1, 0))):
        with Locations(Location((-27.879879662, -1.241354229, 0), (0, 0, 270))):
            Circle(SKETCH_2_R)
        with Locations(Location((-27.879879662, 5.758645771, 0), (0, 0, 270))):
            Circle(SKETCH_2_R)
        with Locations(Location((-20.879879662, -1.241354229, 0), (0, 0, 270))):
            Circle(SKETCH_2_R)
        with Locations(Location((-27.879879662, -8.241354229, 0), (0, 0, 270))):
            Circle(SKETCH_2_R)
        with Locations(Location((-34.879879662, -1.241354229, 0), (0, 0, 270))):
            Circle(SKETCH_2_R)
    extrude(amount=-CUT_EXTRUDE_1_DEPTH, mode=Mode.SUBTRACT)


solid = part.part
